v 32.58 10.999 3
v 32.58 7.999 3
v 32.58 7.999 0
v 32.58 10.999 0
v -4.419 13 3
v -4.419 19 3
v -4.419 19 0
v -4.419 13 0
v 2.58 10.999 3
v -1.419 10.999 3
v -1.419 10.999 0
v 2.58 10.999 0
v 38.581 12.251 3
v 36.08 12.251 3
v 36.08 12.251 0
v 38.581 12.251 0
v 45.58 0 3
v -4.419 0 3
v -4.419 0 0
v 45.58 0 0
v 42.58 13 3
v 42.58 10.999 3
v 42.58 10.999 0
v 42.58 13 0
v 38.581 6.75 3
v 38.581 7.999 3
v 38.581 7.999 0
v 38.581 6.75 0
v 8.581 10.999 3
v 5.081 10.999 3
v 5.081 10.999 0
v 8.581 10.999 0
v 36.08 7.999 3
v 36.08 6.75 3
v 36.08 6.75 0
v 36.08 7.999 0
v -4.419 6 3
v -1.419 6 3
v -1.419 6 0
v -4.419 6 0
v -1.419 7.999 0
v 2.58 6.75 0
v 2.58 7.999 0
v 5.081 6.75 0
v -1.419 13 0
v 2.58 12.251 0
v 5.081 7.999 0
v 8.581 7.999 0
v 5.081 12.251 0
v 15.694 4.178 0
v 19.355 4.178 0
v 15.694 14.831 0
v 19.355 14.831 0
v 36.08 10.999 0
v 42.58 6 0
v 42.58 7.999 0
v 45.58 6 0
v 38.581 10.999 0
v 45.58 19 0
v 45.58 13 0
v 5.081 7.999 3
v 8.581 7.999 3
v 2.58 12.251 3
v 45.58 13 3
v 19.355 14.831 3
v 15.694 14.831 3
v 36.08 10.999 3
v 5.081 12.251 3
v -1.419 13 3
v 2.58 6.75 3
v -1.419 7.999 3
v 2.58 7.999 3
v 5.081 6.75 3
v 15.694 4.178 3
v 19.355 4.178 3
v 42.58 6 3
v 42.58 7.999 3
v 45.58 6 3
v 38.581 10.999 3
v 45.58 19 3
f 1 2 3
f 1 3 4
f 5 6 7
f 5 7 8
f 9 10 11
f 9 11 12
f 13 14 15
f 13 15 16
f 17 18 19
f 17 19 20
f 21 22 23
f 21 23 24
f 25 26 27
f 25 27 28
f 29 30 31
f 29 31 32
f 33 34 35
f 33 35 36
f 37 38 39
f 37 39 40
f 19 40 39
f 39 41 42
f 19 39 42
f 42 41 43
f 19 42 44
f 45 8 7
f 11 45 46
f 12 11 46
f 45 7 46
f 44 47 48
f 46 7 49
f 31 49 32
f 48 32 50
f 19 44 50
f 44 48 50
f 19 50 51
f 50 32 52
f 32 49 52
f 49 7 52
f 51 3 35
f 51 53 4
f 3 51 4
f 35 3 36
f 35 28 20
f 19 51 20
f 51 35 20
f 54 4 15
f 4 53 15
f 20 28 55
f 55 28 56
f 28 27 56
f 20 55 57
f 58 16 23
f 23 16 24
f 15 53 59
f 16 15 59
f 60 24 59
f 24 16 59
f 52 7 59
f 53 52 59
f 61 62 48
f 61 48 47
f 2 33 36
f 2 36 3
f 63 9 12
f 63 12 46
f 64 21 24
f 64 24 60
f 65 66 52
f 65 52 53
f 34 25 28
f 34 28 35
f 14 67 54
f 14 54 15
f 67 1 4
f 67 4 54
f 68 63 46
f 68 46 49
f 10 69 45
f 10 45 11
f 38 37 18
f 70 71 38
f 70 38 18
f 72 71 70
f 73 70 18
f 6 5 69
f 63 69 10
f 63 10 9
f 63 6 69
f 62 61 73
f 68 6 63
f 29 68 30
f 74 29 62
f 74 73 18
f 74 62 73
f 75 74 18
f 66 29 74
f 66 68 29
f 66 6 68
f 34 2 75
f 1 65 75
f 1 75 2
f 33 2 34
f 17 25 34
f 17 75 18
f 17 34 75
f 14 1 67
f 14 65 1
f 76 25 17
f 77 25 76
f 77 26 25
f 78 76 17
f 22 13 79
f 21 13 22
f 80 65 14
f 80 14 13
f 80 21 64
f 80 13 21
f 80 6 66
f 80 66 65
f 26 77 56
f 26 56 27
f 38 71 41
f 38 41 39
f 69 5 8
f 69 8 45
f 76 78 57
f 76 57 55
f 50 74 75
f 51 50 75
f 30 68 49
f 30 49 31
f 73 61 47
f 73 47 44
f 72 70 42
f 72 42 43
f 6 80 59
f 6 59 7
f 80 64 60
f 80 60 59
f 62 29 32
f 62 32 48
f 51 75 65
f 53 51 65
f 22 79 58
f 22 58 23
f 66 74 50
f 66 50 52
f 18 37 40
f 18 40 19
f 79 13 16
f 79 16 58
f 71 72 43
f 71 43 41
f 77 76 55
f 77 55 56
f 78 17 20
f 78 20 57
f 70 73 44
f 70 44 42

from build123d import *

# Parameters (mm, degrees)
SKETCH_1_W      = 3.660528642
SKETCH_1_H      = 10.65279893
EXTRUDE_1_DEPTH = 3


with BuildPart() as part:
    # 草图1 → 凸台-拉伸1 (new body)
    with BuildSketch(Plane.XY.offset(3)):
        Polygon((45.580049157, 0), (45.580049157, 5.99999), (42.580009157, 5.99999), (42.580009157, 7.99949), (38.581009157, 7.99949), (38.581009157, 6.74959), (36.079809157, 6.74959), (36.079809157, 7.99949), (32.580009157, 7.99949), (32.580009157, 10.99949), (36.079809157, 10.99949), (36.079809157, 12.25079), (38.581009157, 12.25079), (38.581009157, 10.99949), (42.580009157, 10.99949), (42.580009157, 13.00039), (45.580049157, 13.00039), (45.580049157, 19.00039), (-4.419390843, 19.00039), (-4.419390843, 13.00039), (-1.419350843, 13.00039), (-1.419350843, 10.99949), (2.579649157, 10.99949), (2.579649157, 12.25079), (5.080849157, 12.25079), (5.080849157, 10.99949), (8.580649157, 10.99949), (8.580649157, 7.99949), (5.080849157, 7.99949), (5.080849157, 6.74959), (2.579649157, 6.74959), (2.579649157, 7.99949), (-1.419350843, 7.99949), (-1.419350843, 5.99999), (-4.419390843, 5.99999), (-4.419390843, 0), align=None)
        with Locations((17.524355382, 9.504123146)):
            Rectangle(SKETCH_1_W, SKETCH_1_H, mode=Mode.SUBTRACT)
    extrude(amount=-EXTRUDE_1_DEPTH)


solid = part.part
